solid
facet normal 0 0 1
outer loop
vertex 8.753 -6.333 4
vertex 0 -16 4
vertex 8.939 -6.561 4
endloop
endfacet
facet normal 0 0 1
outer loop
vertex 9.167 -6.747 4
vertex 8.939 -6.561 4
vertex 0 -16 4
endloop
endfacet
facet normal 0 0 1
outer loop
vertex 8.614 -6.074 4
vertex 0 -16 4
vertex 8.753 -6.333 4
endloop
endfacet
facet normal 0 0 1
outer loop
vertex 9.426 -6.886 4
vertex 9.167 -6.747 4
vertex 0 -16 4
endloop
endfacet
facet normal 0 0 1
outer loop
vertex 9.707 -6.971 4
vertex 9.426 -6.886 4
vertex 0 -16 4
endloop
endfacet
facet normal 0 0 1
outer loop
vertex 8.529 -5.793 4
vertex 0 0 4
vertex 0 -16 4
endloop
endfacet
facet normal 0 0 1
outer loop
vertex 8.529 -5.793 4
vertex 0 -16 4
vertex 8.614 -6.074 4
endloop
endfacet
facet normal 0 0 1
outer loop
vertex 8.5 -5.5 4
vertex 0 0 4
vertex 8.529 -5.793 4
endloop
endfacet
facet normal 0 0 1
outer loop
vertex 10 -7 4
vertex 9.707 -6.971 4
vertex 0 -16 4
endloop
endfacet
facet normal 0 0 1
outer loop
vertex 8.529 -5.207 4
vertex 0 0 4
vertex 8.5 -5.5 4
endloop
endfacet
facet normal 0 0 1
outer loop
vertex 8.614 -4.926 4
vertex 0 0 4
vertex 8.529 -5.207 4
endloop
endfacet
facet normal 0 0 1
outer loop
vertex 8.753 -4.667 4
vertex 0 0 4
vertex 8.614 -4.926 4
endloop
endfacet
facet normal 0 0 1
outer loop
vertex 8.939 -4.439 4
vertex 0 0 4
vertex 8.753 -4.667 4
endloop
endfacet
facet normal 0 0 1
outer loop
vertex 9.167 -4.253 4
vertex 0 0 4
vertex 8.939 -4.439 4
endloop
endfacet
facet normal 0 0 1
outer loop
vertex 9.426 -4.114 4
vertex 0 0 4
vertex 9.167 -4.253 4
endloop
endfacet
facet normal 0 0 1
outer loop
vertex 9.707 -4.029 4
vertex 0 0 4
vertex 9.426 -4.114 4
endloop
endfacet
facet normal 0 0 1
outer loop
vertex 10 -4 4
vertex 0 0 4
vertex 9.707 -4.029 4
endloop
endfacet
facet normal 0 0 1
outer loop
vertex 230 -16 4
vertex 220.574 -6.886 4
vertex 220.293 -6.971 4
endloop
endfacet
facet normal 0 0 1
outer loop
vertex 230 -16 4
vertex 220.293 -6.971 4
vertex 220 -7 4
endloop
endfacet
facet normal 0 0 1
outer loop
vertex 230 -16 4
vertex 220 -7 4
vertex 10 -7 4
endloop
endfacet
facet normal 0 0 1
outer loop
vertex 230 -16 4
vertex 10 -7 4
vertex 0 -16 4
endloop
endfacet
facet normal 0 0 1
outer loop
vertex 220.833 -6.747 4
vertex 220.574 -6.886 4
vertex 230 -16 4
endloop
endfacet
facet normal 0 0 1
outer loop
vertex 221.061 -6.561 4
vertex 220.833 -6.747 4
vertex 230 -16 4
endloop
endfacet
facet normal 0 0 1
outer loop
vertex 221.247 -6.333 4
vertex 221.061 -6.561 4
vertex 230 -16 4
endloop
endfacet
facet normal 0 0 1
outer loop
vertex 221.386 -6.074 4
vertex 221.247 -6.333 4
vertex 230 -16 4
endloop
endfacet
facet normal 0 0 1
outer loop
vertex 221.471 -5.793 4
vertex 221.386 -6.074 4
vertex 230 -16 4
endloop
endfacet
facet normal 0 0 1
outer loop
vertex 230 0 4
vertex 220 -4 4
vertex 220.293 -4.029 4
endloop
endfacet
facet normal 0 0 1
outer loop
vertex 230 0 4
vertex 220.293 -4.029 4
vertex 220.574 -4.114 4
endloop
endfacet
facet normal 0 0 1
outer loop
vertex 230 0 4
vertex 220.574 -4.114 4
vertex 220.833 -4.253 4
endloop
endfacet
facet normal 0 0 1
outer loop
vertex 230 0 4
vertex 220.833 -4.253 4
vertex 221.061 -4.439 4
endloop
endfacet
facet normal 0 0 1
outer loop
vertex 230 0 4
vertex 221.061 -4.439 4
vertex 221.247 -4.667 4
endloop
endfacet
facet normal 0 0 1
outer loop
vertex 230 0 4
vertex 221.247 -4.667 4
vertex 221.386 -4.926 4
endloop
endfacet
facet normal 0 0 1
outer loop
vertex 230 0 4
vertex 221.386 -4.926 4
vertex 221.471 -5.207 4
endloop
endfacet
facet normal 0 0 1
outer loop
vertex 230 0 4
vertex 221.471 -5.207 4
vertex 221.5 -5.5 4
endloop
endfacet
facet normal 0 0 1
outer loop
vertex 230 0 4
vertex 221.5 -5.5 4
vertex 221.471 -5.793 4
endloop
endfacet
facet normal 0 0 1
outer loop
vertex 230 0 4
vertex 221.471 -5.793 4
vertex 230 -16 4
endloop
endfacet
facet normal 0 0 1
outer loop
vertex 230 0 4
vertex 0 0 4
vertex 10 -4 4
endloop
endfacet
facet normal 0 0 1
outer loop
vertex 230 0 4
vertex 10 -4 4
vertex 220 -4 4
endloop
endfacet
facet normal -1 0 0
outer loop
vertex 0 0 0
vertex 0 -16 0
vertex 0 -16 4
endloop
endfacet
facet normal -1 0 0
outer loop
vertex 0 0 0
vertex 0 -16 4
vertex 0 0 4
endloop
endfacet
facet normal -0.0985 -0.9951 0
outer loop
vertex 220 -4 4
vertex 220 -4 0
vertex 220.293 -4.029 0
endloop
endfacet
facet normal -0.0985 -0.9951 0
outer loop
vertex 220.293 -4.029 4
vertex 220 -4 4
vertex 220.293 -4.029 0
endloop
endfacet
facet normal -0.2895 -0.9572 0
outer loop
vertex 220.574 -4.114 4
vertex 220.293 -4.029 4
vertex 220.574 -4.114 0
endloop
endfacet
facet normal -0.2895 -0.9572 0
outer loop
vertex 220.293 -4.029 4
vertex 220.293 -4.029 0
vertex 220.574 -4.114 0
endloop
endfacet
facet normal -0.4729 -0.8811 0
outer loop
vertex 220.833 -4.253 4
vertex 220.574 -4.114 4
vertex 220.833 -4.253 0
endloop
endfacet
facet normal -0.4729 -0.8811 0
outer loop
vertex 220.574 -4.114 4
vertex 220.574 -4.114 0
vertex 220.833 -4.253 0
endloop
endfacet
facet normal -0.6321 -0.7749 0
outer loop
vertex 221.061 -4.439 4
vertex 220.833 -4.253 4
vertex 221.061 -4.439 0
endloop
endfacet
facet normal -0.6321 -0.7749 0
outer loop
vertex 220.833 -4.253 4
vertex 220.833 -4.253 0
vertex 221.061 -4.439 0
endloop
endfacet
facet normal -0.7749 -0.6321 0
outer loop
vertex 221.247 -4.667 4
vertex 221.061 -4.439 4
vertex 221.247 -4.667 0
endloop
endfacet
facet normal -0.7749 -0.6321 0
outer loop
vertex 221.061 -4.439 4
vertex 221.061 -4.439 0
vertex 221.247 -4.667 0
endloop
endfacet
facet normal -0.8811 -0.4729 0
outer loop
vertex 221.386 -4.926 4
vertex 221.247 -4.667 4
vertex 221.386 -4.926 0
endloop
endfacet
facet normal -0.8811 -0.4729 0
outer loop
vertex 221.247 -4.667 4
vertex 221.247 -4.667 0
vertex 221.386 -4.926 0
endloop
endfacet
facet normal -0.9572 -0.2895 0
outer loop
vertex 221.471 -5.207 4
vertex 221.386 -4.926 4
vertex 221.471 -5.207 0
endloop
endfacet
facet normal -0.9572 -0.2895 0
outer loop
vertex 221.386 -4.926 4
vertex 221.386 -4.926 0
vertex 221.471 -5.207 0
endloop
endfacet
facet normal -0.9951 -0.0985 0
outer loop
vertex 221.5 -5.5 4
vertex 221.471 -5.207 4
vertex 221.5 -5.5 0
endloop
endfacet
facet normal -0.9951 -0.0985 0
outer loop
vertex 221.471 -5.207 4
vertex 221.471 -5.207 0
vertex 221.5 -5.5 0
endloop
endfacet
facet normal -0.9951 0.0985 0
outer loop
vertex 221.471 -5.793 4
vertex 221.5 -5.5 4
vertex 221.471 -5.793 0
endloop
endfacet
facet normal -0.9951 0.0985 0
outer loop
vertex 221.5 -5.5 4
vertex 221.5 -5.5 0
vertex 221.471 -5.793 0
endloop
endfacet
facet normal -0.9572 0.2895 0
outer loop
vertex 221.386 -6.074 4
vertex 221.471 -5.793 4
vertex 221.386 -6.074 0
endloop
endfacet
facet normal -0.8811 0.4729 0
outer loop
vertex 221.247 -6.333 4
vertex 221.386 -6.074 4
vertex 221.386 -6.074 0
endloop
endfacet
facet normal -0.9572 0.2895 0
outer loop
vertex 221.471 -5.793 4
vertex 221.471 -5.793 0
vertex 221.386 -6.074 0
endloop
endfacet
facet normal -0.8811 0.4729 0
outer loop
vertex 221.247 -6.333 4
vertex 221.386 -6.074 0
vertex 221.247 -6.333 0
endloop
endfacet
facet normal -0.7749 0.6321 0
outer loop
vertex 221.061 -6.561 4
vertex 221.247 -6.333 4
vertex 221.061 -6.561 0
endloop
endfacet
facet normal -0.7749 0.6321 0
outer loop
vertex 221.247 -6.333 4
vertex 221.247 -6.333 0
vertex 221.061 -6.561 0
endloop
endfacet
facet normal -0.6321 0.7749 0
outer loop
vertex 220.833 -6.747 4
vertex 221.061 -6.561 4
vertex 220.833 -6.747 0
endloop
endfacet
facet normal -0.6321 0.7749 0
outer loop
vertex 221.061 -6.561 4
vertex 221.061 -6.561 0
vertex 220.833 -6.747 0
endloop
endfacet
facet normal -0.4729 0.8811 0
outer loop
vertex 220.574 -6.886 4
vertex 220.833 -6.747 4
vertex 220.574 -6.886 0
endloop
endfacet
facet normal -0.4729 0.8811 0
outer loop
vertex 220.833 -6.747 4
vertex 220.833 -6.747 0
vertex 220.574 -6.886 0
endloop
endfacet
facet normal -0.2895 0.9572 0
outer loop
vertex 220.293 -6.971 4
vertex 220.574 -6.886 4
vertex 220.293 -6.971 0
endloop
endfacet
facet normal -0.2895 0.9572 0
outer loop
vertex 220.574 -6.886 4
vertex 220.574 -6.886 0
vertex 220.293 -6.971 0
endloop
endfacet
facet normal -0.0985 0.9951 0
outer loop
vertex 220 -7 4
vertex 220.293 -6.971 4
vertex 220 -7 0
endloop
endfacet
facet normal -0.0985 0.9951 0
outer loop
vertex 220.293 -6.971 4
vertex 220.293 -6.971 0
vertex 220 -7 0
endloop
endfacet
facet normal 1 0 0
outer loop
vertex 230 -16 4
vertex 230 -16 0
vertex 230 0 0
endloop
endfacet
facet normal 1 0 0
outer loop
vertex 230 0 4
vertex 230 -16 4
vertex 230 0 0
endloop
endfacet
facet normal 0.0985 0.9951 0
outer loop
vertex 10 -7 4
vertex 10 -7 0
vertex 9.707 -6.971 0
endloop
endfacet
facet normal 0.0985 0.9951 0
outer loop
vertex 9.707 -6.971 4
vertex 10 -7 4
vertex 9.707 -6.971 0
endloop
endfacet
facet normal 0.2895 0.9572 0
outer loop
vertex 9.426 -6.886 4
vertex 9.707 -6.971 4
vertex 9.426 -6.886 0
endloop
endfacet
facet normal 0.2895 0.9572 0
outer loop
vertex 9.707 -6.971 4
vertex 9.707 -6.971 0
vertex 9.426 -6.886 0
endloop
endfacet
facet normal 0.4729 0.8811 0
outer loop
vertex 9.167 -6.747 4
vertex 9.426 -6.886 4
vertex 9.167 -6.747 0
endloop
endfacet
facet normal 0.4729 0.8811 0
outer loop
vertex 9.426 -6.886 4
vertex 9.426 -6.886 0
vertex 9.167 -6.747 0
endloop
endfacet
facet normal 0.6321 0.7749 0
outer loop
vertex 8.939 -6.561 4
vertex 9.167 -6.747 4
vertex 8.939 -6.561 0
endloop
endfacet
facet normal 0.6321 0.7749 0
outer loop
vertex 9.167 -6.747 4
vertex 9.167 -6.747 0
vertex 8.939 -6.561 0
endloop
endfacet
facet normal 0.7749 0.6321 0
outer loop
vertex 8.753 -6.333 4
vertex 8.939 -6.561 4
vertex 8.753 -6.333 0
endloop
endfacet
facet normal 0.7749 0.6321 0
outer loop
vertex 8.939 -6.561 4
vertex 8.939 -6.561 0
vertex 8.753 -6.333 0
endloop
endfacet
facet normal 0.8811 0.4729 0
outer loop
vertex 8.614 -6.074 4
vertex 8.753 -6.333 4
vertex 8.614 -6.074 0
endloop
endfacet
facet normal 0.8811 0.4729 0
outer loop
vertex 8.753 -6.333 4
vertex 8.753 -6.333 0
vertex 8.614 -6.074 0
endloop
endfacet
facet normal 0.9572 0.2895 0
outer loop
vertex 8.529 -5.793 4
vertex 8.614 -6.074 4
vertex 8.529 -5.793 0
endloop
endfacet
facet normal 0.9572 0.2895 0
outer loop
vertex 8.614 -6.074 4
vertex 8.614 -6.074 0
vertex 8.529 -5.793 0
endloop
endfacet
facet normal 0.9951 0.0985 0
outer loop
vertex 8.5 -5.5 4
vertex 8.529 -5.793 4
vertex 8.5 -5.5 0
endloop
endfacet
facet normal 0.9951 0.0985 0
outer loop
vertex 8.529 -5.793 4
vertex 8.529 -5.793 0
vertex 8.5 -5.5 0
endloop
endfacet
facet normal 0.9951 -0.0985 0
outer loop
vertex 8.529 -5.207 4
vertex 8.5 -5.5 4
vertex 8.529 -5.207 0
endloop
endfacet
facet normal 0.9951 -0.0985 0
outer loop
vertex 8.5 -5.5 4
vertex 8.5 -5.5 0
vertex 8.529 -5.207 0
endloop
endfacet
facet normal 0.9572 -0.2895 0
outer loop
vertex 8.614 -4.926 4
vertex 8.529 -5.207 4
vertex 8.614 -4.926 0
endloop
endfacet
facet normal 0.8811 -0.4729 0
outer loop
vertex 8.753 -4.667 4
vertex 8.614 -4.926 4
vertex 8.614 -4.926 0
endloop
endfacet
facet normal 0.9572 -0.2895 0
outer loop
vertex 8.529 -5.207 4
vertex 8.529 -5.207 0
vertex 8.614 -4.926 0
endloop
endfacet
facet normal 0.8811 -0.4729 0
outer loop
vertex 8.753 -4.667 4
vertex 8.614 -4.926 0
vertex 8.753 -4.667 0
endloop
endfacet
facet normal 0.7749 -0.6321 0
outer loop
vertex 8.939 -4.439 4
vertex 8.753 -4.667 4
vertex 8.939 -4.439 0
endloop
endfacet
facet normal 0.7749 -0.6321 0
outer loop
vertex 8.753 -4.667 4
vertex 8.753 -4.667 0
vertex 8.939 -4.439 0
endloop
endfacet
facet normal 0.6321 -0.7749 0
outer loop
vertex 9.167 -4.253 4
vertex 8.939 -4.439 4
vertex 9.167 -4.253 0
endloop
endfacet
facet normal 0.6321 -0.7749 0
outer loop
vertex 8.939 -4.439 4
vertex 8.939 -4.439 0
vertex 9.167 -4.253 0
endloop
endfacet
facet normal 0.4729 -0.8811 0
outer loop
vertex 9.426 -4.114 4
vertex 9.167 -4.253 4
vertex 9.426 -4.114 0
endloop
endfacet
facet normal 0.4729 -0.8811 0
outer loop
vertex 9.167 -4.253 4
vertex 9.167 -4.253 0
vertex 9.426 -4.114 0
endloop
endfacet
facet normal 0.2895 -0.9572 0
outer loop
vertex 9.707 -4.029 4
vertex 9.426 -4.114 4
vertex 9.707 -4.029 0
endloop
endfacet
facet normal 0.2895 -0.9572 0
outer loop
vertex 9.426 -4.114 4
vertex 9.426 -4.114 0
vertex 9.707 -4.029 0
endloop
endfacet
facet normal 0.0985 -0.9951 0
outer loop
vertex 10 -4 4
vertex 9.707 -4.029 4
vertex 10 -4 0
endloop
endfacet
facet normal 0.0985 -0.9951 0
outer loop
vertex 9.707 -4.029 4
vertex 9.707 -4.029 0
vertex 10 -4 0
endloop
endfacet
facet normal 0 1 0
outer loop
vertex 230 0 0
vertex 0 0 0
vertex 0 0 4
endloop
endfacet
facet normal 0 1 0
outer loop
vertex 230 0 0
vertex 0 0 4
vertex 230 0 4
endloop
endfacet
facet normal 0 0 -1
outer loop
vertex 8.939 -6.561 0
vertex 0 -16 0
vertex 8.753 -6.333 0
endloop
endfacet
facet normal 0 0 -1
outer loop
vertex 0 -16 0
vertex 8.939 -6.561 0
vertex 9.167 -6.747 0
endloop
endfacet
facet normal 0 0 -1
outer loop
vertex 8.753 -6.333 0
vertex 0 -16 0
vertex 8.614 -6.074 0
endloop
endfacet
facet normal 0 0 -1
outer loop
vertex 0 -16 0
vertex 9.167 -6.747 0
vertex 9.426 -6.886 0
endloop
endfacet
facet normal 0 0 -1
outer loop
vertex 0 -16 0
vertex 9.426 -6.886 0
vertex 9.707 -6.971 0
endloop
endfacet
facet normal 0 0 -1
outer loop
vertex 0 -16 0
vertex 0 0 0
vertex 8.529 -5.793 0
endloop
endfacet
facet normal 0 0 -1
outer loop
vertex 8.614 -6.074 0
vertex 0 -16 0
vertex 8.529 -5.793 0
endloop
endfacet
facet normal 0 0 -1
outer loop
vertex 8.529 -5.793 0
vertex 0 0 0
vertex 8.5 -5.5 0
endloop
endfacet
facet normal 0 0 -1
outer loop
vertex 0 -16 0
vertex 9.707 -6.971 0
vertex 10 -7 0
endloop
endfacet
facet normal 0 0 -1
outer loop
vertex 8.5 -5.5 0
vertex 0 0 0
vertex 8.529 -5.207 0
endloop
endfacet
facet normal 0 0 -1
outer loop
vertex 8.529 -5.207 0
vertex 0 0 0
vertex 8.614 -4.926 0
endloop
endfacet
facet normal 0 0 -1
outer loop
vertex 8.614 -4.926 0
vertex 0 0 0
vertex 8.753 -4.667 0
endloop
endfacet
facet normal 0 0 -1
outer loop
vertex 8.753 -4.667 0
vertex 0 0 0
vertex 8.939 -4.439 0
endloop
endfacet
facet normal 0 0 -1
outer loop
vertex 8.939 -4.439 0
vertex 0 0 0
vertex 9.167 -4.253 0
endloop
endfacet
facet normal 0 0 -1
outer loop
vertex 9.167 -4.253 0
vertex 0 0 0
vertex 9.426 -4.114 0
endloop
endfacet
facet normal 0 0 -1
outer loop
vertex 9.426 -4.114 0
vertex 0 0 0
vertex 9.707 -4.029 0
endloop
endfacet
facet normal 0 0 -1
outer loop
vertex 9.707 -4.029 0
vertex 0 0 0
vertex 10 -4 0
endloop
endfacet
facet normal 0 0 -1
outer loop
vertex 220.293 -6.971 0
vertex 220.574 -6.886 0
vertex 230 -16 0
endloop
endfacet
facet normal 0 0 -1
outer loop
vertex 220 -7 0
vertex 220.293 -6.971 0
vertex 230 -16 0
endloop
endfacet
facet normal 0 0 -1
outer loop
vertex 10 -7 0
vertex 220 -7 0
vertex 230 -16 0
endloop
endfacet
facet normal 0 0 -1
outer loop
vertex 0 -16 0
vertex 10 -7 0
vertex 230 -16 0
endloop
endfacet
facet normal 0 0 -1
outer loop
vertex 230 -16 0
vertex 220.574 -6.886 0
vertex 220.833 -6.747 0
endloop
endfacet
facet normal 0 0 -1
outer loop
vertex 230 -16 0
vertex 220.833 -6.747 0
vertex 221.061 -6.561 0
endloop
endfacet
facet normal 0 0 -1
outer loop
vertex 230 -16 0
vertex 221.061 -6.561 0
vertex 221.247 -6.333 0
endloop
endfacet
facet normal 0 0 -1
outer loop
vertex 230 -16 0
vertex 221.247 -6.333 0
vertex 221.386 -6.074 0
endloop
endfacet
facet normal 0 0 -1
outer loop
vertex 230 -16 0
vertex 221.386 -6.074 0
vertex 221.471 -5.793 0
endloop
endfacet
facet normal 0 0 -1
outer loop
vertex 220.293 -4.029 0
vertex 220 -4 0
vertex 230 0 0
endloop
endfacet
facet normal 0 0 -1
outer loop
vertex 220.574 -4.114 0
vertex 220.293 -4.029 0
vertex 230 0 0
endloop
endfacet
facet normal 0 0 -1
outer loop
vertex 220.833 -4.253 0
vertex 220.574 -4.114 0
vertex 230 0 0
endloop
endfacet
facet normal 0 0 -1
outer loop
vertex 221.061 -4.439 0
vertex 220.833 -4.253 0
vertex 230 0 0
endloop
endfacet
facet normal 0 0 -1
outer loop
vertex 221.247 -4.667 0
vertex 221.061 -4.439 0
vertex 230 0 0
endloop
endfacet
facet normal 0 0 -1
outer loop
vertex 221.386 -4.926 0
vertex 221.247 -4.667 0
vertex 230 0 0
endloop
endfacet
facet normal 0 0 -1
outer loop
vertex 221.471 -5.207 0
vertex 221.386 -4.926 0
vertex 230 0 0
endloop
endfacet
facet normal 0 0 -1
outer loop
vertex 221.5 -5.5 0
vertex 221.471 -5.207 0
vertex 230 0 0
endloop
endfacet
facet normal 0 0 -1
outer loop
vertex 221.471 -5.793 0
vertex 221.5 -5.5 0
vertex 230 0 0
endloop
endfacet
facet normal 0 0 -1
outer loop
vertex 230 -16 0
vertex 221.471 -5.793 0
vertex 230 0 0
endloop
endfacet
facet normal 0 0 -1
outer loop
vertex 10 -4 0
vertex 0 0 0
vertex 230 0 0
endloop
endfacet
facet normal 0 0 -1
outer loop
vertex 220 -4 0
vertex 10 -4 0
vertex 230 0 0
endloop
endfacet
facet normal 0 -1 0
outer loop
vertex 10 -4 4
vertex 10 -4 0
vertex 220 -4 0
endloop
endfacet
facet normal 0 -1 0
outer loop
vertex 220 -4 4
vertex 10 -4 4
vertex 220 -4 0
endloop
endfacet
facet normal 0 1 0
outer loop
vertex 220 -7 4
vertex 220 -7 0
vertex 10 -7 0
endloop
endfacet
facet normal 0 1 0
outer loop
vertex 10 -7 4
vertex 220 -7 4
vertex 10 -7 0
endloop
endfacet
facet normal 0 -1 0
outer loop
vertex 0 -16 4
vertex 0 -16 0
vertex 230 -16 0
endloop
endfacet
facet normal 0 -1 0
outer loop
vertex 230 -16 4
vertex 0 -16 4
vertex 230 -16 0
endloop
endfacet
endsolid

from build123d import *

# Parameters (mm, degrees)
SKETCH_1_W      = 230
SKETCH_1_H      = 16
EXTRUDE_1_DEPTH = 4


with BuildPart() as part:
    # 草图1 → 凸台-拉伸1 (new body)
    with BuildSketch(Plane.XY):
        with Locations((115, -8)):
            Rectangle(SKETCH_1_W, SKETCH_1_H)
        with BuildLine():
            Line((10, -4), (220, -4))
            ThreePointArc((220, -4), (221.5, -5.5), (220, -7))
            Line((220, -7), (10, -7))
            ThreePointArc((10, -7), (8.5, -5.5), (10, -4))
        make_face(mode=Mode.SUBTRACT)
    extrude(amount=EXTRUDE_1_DEPTH)


solid = part.part
